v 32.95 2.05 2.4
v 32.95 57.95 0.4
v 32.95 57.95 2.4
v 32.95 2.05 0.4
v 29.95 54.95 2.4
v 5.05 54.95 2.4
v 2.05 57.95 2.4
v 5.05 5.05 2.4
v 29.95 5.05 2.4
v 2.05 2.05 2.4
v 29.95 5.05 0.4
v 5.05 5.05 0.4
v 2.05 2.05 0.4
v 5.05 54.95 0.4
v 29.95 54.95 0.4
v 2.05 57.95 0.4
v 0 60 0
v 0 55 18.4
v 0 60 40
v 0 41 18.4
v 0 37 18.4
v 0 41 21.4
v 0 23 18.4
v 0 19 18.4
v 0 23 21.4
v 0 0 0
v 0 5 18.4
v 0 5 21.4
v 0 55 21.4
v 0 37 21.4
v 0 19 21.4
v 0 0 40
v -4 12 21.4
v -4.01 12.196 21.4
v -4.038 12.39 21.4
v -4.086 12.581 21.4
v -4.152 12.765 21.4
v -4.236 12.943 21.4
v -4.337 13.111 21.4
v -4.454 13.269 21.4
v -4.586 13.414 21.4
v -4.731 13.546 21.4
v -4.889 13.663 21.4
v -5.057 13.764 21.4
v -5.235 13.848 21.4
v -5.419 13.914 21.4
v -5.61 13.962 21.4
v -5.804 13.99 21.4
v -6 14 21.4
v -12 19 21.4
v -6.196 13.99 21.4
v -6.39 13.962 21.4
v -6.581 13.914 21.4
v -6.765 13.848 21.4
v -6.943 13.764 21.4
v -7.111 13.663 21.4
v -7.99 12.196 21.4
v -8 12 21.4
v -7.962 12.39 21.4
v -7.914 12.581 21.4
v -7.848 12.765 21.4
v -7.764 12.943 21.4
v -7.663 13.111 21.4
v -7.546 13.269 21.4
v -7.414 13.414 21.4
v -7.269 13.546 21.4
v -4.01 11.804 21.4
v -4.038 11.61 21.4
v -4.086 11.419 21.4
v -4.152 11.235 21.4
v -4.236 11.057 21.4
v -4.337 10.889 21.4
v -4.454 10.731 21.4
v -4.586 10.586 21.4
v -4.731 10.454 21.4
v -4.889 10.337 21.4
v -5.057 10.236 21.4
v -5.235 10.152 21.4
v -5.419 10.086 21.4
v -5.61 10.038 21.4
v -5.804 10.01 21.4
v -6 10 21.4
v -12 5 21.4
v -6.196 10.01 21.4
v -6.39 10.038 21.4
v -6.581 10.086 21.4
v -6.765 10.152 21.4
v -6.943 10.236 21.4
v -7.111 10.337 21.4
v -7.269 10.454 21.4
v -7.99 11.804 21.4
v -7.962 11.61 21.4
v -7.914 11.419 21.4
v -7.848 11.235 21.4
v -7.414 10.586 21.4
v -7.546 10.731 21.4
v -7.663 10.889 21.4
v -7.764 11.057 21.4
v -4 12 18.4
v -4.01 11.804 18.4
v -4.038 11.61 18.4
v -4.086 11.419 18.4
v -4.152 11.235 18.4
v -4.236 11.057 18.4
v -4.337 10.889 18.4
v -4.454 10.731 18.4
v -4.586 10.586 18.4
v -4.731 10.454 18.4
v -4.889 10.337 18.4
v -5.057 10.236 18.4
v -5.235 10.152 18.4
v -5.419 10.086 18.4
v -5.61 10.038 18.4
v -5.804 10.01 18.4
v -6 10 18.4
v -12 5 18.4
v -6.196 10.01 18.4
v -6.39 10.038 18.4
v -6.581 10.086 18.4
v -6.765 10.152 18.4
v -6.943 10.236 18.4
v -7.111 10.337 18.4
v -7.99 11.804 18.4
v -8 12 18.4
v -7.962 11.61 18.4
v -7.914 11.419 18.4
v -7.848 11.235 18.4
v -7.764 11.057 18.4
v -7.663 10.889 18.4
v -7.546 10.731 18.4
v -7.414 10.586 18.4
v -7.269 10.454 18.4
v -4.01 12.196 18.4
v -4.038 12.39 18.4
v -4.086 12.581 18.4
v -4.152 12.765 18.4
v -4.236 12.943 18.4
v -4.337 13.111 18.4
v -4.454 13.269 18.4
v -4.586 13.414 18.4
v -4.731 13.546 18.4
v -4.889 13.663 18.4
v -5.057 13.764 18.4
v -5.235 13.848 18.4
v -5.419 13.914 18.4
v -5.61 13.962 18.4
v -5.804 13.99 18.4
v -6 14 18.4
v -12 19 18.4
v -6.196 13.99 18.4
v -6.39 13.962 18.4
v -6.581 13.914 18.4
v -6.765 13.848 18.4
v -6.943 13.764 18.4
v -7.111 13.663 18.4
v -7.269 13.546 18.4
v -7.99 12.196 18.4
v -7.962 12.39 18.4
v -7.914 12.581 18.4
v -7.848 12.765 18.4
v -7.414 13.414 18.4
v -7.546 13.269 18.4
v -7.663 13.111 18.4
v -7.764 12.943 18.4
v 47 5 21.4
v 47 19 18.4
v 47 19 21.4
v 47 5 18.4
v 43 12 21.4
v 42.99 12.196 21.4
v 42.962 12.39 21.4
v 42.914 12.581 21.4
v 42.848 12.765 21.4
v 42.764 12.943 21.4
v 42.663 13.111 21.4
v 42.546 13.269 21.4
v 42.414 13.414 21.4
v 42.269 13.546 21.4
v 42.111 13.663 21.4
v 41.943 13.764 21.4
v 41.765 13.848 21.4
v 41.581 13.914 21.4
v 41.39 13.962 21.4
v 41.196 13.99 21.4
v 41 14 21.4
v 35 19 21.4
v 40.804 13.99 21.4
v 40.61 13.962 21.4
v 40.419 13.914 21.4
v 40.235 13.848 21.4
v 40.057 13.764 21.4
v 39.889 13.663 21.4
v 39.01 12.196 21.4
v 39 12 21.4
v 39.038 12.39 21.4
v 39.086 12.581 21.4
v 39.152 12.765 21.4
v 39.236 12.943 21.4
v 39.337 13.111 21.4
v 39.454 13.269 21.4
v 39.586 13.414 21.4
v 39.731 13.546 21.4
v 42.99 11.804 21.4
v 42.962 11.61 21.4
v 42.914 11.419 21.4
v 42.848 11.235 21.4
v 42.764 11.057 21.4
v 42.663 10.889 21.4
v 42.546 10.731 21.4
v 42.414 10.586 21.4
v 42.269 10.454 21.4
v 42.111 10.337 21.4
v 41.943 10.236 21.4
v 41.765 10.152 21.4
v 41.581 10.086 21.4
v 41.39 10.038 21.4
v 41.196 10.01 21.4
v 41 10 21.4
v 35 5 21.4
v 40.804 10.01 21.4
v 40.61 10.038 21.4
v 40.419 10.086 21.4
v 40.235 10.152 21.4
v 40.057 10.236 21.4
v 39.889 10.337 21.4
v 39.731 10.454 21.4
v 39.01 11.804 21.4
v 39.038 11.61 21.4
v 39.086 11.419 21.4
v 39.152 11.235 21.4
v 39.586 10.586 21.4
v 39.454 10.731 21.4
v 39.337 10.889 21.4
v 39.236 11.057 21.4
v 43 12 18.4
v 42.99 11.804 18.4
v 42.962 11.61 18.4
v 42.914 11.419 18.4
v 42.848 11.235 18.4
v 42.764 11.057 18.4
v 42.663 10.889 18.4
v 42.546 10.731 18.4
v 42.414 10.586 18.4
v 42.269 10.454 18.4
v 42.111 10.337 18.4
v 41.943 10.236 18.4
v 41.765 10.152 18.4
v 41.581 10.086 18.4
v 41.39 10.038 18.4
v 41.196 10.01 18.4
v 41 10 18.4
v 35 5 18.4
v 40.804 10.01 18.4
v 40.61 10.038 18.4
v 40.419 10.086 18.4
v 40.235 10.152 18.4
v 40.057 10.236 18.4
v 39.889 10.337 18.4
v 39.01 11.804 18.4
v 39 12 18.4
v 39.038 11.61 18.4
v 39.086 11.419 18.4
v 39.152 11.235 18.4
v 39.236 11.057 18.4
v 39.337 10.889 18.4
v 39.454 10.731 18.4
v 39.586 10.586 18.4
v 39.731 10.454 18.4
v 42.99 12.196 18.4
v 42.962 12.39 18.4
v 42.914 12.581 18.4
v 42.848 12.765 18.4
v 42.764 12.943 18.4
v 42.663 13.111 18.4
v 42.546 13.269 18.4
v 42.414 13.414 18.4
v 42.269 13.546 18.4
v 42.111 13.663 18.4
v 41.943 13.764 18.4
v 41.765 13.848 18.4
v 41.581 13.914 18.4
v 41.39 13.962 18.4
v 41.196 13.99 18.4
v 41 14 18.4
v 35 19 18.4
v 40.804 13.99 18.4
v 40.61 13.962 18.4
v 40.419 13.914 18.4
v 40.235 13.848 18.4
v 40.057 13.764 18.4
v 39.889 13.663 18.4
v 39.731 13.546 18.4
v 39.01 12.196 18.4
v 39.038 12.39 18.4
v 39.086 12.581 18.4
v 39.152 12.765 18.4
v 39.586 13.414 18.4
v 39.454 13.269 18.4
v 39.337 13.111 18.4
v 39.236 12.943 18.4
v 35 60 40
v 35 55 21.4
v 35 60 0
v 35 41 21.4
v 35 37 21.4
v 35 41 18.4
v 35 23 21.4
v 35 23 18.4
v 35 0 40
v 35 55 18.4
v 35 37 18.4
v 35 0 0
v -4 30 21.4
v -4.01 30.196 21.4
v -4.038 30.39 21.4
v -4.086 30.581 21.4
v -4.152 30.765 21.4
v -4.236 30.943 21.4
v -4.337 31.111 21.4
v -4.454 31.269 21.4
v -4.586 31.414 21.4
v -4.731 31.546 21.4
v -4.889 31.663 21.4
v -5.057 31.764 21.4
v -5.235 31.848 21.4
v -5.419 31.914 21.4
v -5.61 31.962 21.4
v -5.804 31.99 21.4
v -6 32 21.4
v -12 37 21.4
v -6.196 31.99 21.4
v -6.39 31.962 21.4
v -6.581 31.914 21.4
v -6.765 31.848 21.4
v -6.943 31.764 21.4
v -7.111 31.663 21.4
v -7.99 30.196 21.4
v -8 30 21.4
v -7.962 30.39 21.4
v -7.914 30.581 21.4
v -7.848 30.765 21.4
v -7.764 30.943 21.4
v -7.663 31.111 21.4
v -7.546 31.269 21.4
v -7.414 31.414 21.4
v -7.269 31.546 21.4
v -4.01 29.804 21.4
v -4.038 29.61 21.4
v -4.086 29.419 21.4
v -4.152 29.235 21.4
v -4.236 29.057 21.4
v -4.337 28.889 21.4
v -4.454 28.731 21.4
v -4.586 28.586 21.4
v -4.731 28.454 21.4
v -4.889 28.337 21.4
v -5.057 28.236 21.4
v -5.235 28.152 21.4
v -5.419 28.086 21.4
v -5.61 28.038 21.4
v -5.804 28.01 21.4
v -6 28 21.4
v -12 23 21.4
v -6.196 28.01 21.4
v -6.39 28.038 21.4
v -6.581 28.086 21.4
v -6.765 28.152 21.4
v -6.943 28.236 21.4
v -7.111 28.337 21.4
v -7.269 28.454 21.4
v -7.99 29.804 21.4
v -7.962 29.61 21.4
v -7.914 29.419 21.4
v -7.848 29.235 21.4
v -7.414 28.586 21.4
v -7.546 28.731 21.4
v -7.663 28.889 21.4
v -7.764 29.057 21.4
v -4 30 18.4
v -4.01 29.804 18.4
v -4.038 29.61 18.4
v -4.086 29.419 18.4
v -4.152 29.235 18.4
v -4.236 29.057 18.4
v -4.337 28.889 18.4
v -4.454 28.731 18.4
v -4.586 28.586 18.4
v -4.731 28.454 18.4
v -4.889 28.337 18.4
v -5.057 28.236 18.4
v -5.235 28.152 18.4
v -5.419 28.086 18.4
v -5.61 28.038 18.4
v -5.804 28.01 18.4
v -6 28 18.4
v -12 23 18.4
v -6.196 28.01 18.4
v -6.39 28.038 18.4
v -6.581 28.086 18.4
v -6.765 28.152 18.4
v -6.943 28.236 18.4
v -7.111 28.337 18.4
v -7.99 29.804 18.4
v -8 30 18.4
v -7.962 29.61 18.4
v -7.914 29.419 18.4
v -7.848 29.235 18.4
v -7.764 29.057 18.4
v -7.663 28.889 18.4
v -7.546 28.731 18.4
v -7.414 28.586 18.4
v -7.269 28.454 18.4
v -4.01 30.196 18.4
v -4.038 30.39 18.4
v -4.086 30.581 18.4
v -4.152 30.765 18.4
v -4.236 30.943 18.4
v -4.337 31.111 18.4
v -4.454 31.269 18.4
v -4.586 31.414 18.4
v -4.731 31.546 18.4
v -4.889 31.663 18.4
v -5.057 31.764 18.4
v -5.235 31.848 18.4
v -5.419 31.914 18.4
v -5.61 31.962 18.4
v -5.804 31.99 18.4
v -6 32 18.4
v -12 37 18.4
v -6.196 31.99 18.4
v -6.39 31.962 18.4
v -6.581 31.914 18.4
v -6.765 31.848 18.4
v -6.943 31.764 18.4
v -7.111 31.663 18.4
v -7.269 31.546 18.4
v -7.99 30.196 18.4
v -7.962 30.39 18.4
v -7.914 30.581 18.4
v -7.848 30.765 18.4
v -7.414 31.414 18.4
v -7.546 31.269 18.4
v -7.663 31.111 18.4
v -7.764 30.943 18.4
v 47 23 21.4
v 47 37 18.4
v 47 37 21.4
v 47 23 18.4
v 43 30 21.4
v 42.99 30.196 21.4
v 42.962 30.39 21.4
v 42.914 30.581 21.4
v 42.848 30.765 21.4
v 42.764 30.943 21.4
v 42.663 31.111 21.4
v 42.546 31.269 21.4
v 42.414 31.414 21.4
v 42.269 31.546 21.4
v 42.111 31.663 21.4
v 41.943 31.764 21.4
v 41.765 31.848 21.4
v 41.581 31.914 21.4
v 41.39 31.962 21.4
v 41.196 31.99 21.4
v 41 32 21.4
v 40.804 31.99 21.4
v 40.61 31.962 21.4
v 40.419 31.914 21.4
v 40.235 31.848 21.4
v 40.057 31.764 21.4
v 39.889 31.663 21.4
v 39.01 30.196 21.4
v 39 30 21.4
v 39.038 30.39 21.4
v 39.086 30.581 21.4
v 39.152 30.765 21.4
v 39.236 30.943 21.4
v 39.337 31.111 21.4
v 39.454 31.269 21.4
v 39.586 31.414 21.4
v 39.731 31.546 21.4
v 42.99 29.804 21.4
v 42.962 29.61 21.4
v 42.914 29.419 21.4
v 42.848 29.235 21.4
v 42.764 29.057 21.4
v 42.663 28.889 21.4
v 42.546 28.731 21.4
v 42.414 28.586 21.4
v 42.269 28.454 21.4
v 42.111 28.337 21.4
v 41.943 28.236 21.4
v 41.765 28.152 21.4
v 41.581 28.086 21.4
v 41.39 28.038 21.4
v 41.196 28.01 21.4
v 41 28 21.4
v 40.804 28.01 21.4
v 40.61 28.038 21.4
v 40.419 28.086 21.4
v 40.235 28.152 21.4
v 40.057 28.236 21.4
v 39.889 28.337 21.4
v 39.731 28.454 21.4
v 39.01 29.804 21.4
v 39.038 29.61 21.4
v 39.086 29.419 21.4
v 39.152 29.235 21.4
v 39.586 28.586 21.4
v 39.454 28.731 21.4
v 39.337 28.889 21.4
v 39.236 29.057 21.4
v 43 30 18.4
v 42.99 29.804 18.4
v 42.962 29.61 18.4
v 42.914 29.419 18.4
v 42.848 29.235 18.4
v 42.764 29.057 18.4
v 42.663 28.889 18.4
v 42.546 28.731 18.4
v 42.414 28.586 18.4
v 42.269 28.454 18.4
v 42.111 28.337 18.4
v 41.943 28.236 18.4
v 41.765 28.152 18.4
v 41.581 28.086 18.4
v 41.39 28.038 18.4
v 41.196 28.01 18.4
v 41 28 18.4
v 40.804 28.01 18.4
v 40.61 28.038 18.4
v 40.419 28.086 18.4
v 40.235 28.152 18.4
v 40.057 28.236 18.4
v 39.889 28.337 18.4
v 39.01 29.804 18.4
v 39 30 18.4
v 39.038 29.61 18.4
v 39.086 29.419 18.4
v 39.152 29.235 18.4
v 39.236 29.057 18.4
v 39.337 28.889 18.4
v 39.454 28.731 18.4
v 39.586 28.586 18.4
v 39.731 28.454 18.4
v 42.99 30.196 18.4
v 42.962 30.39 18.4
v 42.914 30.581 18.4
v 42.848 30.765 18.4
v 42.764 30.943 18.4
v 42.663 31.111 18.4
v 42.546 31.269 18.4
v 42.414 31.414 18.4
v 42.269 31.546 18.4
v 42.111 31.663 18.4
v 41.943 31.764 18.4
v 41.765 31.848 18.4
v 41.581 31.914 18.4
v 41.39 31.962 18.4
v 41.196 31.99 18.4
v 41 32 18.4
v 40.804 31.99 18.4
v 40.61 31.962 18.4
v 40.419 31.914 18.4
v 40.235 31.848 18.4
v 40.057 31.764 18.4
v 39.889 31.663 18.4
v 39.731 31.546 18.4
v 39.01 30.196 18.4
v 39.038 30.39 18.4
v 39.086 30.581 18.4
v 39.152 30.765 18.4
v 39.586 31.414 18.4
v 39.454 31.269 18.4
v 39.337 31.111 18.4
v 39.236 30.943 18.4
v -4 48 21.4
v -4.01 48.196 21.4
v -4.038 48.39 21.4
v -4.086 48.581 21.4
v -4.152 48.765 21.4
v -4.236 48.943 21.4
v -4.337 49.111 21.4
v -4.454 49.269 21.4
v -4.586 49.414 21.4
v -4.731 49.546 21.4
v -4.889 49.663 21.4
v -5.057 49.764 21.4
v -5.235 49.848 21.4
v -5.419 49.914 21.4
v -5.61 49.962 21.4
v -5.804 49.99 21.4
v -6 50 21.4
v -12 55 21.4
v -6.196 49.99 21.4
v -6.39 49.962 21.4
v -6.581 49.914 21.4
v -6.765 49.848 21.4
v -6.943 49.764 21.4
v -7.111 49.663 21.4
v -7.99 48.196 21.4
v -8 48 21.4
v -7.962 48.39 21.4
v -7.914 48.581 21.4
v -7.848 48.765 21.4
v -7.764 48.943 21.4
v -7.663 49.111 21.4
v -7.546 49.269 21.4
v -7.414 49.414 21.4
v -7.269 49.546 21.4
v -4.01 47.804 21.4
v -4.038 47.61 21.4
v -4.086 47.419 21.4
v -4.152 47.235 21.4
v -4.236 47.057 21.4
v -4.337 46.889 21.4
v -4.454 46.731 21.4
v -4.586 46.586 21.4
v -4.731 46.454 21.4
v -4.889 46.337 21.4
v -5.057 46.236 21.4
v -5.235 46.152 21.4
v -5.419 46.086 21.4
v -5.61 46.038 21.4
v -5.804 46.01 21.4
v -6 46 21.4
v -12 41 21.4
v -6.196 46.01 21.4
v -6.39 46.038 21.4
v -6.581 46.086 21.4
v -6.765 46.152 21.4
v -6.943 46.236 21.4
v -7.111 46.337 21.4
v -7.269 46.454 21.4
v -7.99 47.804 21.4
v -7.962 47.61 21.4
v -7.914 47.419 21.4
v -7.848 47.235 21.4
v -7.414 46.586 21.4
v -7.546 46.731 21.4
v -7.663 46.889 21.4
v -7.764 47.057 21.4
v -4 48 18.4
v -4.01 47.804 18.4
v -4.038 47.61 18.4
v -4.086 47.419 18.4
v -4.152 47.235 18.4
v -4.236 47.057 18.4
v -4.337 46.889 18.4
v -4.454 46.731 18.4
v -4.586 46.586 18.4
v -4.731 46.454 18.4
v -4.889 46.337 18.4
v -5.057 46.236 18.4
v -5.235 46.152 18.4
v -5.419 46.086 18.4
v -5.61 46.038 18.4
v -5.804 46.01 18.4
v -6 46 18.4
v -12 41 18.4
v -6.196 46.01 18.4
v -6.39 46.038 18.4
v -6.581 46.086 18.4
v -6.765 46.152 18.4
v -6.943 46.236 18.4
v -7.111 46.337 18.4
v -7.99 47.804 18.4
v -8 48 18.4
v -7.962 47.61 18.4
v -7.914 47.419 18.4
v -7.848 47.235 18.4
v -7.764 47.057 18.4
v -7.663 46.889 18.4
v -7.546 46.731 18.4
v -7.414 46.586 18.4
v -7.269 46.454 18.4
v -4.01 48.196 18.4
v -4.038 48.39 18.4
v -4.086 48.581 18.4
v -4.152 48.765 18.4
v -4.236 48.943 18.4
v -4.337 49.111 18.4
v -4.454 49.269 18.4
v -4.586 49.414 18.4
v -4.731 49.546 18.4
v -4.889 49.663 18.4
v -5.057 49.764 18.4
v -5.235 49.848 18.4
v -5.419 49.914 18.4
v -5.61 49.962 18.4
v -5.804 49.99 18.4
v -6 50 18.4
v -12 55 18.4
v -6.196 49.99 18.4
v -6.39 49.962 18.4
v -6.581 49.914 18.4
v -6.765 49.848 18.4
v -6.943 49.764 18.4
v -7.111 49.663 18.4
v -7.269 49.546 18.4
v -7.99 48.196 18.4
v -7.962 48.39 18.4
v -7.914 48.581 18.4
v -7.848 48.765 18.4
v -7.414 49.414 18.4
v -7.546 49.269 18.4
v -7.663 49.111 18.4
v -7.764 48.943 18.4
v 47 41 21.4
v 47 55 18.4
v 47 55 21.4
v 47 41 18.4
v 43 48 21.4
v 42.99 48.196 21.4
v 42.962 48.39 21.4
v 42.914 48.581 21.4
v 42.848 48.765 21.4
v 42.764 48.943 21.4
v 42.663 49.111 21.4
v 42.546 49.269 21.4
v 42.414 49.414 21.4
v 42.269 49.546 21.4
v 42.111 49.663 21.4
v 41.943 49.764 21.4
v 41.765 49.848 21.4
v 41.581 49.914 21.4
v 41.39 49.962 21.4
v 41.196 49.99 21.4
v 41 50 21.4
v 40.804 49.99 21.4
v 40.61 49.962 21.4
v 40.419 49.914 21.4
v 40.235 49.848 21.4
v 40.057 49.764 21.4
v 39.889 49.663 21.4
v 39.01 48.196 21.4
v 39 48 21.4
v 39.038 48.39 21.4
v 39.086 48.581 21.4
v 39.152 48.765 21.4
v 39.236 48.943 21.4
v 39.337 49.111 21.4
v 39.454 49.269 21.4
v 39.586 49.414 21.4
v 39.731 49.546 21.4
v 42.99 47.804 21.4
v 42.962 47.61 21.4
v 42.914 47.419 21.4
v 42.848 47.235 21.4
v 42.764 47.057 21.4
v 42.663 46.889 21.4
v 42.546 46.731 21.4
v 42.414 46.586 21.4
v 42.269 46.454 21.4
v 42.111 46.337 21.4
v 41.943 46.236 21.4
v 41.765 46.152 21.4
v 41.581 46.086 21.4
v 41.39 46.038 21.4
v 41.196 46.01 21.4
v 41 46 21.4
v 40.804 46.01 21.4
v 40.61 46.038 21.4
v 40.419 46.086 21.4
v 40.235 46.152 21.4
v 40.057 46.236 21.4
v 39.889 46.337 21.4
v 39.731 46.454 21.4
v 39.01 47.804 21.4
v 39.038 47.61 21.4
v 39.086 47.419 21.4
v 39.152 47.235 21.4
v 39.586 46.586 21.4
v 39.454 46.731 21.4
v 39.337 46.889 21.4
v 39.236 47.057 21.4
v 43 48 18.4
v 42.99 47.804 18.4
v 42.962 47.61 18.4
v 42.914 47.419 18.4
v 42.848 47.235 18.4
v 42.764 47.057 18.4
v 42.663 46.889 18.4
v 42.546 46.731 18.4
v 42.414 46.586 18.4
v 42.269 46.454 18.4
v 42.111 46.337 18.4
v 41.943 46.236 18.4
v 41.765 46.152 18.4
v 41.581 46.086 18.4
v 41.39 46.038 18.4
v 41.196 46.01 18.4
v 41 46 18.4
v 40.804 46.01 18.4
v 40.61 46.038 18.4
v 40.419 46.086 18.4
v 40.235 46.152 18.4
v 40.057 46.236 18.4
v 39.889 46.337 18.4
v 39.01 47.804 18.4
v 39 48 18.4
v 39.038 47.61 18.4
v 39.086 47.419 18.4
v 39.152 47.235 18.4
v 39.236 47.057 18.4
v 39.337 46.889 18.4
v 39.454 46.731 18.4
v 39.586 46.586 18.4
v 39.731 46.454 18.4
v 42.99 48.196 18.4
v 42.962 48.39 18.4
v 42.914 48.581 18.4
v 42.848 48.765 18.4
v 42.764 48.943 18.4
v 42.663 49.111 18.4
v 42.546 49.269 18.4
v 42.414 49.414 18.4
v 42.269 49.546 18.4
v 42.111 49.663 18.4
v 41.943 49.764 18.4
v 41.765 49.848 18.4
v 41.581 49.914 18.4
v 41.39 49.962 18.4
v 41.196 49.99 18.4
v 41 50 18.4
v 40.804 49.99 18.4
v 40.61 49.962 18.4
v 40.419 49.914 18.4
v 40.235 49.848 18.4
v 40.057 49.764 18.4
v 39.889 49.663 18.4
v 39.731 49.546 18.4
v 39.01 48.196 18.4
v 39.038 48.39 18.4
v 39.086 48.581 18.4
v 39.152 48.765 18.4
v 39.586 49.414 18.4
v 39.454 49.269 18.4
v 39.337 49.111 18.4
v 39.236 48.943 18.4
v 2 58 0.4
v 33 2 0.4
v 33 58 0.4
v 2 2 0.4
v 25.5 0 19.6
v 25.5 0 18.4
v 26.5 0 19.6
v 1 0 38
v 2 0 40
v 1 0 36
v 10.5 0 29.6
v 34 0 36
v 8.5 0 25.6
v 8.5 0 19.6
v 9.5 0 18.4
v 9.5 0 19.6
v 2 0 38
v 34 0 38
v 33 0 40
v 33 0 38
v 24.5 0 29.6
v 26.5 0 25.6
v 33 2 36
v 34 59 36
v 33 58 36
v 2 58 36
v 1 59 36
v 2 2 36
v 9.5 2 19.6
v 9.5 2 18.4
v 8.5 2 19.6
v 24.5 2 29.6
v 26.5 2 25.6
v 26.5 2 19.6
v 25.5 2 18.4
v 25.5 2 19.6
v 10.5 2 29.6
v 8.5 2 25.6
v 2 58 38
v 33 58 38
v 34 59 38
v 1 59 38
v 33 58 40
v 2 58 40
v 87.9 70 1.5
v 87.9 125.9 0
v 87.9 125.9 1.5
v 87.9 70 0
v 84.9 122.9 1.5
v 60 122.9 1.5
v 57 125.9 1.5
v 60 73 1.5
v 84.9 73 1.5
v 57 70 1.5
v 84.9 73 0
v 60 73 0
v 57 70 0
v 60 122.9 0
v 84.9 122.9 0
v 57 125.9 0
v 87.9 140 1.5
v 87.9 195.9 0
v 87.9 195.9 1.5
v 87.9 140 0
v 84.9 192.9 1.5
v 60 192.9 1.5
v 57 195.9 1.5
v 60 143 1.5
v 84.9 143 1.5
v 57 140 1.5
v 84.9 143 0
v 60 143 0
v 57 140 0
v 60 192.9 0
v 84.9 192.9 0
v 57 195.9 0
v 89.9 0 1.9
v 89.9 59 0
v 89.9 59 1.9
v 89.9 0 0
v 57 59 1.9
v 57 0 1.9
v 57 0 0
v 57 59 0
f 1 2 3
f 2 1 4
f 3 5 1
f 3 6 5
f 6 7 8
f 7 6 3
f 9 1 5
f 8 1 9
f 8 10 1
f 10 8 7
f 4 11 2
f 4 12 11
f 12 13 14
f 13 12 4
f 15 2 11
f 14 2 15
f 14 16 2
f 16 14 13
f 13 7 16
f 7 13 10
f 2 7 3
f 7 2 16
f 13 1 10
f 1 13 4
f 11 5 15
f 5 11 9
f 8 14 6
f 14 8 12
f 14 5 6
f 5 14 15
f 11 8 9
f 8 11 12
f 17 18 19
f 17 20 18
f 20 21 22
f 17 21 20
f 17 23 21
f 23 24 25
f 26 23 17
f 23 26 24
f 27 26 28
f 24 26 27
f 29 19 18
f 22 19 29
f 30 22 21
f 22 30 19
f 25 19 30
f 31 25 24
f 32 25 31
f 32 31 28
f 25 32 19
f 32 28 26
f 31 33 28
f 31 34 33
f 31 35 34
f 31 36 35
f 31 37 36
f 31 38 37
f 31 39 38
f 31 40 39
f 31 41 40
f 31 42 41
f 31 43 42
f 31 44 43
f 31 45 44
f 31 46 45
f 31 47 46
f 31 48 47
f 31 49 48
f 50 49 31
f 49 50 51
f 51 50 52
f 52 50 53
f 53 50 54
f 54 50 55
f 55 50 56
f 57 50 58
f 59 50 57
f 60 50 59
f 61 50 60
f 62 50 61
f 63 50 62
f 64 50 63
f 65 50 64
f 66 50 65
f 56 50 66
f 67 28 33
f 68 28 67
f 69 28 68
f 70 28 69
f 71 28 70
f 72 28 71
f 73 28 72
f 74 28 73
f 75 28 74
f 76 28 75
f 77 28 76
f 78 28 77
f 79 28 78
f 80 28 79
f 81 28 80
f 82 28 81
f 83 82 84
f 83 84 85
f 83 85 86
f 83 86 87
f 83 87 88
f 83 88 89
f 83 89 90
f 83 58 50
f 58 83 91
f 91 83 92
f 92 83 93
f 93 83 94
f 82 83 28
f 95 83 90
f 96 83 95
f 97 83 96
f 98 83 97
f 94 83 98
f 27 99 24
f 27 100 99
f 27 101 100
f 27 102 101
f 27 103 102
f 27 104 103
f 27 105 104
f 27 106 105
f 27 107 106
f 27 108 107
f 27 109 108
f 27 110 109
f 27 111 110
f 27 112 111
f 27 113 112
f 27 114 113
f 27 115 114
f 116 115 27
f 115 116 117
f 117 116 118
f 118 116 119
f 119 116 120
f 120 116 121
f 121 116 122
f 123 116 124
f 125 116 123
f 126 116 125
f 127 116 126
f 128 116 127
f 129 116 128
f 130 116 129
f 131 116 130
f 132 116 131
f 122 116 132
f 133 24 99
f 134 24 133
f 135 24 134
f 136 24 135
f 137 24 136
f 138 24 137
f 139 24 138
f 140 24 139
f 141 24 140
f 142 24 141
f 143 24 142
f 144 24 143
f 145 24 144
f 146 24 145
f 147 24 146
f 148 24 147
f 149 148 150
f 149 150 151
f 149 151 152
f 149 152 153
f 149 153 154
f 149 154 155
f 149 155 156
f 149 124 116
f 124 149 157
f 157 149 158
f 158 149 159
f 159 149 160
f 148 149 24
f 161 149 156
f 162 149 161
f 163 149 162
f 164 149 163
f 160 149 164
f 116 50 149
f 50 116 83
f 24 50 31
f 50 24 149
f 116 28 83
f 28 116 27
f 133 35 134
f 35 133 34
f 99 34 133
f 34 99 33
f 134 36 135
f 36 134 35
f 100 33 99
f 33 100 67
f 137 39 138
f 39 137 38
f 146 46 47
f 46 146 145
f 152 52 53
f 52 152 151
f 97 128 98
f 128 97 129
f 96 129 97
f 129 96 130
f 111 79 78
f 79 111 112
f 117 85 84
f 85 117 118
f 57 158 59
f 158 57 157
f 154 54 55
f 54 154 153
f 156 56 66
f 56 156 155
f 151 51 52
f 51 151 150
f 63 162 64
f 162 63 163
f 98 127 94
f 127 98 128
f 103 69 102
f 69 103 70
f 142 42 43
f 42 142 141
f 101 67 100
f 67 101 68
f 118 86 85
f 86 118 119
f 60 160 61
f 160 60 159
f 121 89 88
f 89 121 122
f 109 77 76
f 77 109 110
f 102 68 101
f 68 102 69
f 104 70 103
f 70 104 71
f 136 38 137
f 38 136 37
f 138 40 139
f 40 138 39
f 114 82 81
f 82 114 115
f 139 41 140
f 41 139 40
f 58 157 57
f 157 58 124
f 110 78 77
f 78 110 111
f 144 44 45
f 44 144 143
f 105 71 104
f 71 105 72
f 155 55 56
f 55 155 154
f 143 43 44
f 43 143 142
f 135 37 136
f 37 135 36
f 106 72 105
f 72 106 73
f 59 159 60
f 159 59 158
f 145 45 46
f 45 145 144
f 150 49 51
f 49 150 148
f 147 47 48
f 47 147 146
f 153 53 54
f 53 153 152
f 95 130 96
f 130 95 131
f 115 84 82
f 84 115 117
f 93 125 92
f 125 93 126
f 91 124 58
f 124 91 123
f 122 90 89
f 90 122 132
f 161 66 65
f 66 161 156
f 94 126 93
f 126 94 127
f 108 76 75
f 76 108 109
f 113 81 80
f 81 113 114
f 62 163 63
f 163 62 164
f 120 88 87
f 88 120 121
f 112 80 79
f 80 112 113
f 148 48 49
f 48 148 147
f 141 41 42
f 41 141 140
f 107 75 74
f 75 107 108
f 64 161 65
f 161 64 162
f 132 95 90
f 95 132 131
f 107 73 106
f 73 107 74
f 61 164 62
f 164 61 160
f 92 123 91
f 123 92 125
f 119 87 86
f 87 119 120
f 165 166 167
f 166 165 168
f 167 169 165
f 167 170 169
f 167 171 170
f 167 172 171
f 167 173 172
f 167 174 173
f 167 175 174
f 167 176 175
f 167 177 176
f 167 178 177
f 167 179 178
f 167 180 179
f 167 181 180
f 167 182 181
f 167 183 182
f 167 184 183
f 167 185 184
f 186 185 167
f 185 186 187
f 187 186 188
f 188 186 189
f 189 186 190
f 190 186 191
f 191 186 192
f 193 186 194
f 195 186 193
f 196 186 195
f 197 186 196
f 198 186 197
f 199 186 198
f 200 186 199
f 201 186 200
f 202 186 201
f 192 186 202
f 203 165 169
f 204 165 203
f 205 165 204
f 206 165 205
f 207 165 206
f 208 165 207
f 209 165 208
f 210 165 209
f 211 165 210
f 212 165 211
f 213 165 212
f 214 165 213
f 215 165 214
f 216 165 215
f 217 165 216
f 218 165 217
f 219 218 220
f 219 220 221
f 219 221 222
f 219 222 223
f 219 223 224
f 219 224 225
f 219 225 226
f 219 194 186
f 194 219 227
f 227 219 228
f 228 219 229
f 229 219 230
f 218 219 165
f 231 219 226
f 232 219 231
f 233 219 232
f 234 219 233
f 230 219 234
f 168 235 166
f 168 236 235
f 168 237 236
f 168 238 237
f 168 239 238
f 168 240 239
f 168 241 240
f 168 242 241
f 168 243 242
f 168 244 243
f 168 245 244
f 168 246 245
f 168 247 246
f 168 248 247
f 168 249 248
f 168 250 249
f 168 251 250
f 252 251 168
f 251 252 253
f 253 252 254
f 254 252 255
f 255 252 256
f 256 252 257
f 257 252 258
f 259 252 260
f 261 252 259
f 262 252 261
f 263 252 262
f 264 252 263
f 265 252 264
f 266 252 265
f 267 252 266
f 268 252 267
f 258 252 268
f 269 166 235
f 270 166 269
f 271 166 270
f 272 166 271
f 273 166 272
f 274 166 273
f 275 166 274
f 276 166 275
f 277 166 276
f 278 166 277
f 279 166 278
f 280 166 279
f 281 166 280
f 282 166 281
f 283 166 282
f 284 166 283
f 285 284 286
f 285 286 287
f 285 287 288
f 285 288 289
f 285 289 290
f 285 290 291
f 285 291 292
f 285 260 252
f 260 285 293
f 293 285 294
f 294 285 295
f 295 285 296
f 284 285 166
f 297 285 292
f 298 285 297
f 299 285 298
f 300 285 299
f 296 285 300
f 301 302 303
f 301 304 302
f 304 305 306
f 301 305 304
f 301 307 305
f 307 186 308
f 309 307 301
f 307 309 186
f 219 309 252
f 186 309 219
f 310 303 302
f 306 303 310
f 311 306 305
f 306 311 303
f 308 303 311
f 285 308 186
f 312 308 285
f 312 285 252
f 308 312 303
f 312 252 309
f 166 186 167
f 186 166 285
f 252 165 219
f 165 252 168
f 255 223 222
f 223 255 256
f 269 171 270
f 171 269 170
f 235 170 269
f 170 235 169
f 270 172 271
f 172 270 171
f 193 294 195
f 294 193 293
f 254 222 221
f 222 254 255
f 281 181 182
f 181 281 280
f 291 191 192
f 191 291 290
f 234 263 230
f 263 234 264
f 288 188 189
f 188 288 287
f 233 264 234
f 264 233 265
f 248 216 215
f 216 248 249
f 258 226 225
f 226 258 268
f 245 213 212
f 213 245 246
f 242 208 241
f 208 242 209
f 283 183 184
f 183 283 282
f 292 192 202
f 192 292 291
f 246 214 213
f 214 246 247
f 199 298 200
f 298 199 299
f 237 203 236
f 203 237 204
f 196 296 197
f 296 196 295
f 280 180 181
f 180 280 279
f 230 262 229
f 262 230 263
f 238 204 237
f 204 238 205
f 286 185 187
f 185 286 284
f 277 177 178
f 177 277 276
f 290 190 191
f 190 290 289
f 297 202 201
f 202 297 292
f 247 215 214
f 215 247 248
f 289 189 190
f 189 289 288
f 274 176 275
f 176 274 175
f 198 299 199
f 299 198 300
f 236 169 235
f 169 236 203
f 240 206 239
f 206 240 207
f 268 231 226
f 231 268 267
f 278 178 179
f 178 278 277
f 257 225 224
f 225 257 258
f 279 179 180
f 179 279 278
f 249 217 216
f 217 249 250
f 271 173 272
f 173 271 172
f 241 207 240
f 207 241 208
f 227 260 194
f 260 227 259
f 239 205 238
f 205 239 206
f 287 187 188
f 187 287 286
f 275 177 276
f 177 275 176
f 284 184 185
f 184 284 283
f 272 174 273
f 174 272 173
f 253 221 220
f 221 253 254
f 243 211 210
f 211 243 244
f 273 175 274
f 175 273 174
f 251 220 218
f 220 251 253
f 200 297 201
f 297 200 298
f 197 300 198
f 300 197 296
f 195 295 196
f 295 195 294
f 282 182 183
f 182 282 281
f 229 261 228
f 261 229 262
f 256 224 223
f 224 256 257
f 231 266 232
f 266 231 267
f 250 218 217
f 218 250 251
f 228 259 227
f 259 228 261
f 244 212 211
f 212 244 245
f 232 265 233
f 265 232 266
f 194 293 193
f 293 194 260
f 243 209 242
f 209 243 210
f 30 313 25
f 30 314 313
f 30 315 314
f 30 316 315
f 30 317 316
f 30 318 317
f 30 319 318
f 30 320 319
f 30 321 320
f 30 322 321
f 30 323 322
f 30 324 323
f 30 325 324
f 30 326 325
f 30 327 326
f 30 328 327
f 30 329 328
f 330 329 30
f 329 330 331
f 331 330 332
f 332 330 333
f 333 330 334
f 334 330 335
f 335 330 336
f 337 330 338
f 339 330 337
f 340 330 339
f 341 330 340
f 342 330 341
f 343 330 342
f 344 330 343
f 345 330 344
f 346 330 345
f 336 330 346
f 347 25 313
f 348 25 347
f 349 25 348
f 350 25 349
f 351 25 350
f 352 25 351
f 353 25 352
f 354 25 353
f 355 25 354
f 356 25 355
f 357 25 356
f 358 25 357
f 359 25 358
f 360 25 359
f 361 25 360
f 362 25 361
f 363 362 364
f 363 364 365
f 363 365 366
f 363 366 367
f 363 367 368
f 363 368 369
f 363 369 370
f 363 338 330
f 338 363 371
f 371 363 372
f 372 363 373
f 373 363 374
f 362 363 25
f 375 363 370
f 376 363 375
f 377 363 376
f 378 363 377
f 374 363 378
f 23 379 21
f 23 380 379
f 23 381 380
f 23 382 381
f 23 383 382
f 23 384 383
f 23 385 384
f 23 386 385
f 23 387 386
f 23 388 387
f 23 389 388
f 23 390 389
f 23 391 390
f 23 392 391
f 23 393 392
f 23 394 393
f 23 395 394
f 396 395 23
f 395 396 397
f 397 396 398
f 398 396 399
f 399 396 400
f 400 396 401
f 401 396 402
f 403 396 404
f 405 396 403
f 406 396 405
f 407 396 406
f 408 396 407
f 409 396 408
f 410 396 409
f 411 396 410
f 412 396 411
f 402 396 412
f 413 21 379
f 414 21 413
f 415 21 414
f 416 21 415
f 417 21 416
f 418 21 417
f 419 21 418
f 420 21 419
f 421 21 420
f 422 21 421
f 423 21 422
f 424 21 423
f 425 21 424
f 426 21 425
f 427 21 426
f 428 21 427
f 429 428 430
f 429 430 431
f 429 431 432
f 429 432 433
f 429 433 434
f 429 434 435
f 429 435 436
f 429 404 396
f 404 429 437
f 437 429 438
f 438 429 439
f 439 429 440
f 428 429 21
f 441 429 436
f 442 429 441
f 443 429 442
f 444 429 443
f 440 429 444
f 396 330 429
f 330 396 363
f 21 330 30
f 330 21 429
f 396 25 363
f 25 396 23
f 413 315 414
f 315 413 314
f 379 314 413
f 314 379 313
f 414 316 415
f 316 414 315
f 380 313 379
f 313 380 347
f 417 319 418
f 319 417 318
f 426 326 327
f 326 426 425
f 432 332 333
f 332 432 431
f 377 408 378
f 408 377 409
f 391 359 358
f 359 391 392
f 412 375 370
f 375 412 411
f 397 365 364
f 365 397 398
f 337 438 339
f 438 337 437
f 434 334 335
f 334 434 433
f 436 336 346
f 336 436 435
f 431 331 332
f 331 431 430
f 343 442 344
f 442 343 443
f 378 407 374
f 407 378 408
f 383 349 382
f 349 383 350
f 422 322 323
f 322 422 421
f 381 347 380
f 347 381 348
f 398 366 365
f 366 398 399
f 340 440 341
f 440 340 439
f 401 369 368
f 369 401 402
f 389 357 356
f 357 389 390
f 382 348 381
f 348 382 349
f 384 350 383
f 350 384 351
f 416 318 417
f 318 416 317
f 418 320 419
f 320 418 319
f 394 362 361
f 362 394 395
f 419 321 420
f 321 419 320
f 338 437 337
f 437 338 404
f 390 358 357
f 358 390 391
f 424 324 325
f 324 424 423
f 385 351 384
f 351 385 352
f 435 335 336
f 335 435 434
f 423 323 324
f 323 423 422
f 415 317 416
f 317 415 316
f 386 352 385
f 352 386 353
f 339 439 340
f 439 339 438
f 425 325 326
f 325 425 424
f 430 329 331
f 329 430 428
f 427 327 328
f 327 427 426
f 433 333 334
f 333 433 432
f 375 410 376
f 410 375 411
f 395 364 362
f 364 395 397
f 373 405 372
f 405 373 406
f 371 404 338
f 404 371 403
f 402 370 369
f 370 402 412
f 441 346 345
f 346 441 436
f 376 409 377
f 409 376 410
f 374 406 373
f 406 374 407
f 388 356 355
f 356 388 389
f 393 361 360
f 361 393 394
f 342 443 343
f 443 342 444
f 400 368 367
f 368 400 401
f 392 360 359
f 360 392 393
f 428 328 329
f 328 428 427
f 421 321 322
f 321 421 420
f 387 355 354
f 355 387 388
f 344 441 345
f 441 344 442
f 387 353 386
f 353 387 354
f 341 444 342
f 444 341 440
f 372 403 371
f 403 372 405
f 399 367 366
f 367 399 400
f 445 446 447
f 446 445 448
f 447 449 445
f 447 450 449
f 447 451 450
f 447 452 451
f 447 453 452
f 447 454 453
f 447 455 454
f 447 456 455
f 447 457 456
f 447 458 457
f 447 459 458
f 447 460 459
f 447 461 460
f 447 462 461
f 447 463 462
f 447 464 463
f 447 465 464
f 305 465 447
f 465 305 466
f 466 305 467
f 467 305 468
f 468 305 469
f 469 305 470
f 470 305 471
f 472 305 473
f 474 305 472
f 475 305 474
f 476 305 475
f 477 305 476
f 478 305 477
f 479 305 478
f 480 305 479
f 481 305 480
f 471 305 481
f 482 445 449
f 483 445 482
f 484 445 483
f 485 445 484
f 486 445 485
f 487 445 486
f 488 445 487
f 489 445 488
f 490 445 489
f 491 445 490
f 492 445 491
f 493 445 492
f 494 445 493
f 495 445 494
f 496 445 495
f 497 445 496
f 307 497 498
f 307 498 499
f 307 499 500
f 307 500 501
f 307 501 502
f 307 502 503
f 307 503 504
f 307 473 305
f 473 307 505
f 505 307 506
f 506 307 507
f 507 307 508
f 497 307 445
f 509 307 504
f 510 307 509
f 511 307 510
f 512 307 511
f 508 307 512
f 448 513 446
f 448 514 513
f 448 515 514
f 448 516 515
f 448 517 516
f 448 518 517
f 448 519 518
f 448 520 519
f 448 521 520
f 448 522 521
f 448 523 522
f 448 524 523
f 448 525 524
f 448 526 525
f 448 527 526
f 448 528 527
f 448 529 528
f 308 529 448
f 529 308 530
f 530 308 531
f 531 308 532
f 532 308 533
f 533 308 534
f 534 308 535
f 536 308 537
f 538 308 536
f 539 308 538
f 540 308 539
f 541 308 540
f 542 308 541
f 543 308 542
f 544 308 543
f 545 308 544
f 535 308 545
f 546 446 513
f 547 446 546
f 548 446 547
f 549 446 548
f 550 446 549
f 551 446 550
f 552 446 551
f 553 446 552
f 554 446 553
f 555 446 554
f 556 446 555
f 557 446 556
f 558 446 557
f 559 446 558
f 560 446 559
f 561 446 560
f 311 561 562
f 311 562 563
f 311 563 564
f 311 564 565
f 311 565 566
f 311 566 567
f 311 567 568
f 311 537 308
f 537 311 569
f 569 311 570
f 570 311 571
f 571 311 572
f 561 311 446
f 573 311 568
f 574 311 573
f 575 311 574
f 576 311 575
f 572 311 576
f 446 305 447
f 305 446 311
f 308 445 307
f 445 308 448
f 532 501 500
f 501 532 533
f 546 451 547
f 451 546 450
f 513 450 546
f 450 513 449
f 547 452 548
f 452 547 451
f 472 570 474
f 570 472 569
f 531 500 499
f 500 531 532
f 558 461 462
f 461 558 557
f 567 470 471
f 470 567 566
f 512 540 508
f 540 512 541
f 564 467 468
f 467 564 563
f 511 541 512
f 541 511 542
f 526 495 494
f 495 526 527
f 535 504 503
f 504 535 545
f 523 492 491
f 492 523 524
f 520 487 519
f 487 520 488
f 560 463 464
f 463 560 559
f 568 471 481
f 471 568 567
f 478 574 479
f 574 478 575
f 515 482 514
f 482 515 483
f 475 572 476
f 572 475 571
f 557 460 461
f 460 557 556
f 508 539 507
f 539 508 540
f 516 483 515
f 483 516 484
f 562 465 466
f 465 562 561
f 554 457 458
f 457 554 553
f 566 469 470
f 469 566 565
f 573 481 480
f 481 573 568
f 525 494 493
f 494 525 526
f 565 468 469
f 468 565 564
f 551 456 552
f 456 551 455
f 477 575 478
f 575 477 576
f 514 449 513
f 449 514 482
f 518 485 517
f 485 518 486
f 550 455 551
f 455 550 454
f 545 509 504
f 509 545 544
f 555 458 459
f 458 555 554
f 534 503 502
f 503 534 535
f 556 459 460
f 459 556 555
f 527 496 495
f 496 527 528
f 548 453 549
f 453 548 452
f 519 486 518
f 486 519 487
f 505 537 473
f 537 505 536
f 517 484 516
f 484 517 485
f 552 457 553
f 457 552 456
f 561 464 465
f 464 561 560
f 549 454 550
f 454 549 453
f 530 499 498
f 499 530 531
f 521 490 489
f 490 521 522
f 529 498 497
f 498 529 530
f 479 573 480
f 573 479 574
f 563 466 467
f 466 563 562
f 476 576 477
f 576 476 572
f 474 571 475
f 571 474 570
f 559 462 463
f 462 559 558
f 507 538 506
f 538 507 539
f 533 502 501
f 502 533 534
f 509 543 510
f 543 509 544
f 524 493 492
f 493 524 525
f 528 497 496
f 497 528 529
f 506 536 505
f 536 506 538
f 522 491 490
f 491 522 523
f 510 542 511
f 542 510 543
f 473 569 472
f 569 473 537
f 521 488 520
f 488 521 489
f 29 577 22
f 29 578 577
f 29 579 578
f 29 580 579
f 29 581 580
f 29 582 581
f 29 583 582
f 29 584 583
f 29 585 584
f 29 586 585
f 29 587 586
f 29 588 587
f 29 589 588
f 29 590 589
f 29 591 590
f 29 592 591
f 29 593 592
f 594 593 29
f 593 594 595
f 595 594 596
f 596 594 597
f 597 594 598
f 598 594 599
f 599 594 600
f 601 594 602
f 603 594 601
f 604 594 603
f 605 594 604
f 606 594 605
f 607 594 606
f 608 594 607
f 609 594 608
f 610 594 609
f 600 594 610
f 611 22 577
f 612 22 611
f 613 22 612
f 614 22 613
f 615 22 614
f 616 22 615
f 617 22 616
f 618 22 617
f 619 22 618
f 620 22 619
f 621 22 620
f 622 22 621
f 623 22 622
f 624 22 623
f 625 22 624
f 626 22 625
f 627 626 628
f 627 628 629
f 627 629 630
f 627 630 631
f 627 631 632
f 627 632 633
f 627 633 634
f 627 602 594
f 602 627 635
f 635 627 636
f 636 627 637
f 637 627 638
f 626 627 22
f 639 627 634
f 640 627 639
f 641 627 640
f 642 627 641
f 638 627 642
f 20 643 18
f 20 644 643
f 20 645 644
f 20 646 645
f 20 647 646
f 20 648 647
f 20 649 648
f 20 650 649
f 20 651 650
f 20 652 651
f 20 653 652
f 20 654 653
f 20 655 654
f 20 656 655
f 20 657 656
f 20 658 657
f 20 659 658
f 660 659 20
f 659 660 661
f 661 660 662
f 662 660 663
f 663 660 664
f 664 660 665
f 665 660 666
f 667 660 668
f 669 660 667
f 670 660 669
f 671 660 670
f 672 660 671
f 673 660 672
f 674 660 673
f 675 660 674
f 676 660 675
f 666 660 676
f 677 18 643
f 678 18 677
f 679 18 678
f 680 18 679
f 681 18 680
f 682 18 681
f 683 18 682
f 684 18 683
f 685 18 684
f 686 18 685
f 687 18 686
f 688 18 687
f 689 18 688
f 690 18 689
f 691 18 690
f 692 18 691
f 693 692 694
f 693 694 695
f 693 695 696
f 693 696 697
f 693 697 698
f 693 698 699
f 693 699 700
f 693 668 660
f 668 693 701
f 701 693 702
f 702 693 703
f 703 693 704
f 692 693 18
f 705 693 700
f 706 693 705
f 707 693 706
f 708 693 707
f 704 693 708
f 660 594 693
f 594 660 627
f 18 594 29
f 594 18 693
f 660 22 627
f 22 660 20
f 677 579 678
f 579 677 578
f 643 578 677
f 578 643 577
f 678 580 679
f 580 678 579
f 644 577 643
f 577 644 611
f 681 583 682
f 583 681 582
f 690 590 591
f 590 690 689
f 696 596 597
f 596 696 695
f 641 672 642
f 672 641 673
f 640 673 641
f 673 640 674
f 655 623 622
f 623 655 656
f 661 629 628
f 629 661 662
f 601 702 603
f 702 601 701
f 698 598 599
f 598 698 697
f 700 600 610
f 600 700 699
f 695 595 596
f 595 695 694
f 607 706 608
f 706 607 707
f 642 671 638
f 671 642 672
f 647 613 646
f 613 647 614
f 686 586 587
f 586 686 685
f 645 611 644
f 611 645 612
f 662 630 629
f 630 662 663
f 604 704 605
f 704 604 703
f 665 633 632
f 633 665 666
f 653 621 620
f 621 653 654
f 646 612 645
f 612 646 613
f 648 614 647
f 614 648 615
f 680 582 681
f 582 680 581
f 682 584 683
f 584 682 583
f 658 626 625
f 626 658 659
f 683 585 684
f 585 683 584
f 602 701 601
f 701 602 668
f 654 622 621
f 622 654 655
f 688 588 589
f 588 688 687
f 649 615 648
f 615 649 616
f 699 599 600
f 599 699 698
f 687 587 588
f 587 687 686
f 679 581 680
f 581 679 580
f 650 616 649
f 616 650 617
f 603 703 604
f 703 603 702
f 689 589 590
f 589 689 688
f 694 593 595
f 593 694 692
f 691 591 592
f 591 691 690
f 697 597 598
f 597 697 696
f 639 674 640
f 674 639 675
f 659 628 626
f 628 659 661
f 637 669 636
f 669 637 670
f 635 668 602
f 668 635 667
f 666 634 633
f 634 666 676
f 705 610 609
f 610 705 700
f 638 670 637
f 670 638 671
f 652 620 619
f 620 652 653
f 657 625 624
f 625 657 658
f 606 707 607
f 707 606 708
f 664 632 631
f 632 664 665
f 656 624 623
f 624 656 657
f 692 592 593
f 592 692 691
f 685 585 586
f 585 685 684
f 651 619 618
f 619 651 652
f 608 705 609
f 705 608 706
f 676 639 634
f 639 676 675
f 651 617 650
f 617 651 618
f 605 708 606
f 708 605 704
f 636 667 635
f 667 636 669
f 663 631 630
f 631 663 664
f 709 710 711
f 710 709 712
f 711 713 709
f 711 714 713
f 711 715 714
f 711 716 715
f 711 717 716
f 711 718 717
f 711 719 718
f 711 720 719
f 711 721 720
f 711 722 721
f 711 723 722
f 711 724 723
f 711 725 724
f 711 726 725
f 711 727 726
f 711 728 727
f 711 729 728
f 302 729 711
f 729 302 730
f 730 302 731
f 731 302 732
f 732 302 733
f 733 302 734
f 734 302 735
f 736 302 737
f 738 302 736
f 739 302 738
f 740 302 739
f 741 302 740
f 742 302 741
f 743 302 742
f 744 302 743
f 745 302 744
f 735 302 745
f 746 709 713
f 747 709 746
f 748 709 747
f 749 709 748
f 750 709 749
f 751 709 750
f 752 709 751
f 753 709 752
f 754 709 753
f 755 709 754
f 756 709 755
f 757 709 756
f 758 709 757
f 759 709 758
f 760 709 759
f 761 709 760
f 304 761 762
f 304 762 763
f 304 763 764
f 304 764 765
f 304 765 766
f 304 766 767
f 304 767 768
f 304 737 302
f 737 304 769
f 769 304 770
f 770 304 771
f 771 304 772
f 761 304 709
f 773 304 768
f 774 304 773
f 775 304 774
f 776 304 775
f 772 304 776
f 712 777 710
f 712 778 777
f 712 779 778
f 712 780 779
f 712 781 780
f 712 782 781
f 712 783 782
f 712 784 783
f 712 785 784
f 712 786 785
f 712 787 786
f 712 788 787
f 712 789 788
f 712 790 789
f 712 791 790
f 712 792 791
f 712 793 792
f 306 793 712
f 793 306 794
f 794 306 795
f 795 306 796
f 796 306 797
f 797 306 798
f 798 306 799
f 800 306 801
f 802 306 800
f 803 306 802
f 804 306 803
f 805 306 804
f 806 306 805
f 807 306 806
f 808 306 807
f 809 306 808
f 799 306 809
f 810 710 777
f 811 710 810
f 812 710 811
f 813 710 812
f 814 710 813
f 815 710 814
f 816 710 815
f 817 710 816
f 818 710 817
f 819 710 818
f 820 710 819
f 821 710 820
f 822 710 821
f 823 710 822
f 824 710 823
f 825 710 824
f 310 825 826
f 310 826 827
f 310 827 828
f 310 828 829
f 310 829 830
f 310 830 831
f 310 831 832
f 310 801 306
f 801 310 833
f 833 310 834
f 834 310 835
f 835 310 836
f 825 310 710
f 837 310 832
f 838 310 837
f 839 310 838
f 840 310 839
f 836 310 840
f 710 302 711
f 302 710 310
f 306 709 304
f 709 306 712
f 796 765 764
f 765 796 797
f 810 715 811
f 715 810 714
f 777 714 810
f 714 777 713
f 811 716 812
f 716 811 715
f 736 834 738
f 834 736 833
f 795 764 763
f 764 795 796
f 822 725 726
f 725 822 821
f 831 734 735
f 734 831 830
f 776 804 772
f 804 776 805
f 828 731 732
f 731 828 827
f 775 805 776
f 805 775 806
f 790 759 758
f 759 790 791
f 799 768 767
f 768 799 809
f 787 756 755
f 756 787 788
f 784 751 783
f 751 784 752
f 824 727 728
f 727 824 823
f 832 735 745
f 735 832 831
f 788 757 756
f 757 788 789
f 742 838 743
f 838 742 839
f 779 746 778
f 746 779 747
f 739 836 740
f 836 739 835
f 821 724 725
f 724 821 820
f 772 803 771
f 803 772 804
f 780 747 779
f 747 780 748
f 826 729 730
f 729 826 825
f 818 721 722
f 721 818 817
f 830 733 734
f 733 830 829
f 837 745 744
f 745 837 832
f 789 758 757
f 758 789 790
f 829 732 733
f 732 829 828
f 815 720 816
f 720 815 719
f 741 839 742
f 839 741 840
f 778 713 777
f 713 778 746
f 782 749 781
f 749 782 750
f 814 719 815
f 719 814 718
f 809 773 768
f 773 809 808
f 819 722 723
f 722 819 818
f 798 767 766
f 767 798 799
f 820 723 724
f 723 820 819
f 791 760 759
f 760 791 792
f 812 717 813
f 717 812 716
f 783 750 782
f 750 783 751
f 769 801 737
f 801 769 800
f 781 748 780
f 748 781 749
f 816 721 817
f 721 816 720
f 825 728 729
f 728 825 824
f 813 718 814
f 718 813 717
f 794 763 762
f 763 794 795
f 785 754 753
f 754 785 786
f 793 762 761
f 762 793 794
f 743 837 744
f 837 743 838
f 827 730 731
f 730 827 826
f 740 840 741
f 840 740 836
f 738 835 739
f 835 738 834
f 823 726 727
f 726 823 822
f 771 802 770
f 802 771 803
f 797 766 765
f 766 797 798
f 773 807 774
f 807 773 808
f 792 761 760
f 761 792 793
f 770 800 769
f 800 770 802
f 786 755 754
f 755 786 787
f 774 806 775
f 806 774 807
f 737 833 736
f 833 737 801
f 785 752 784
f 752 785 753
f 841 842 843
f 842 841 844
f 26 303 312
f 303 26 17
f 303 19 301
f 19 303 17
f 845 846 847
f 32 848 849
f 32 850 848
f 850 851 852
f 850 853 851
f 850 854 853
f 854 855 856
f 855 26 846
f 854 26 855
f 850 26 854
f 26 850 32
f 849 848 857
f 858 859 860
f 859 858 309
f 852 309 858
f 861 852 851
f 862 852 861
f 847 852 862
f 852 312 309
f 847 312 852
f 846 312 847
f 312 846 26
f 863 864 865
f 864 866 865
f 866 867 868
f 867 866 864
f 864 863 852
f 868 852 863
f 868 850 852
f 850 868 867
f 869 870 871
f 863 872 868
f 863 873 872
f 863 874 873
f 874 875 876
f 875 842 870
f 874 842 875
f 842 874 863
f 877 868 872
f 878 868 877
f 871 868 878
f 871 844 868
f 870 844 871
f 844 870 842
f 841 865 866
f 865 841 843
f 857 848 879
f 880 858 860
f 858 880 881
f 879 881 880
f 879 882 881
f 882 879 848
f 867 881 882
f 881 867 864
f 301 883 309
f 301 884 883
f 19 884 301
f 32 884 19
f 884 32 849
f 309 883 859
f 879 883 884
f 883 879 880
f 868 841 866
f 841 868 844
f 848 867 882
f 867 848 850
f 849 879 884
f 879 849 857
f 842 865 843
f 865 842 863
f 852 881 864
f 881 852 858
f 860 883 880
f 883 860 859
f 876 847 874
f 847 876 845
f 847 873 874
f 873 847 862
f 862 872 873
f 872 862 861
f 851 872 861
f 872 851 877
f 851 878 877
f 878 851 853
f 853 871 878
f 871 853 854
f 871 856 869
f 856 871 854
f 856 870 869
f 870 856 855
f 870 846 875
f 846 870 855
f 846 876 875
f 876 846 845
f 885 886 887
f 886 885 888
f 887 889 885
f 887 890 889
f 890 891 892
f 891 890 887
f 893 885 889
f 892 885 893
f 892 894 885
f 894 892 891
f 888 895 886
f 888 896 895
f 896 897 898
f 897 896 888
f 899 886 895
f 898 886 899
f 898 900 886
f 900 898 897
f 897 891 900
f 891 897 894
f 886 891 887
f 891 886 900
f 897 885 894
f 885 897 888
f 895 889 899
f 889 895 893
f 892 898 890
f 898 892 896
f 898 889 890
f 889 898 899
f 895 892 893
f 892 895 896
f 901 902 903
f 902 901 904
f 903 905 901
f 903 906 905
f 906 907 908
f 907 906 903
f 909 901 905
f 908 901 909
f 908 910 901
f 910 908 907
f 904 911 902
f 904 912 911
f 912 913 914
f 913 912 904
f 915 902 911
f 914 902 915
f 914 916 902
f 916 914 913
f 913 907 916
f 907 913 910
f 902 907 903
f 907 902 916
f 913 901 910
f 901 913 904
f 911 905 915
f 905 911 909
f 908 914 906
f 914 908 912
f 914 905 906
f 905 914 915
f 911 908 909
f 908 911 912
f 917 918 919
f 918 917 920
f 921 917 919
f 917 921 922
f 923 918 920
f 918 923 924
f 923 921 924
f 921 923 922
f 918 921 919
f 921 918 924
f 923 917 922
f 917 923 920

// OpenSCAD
/*
CAIXA PARA COLMEIA COM TAMPA DESLIZANTE, MOLDURA FIXA E 2 MOLDURAS INTERNAS SEM FUROS
Medidas em milímetros.

Atualizações desta versão:
- Mantém a caixa e a tampa deslizante.
- As 2 molduras soltas ficam separadas para impressão.
- Molduras soltas SEM furos laterais, pois não serão parafusadas.
- Molduras soltas com 30,9 x 55,9 mm para encaixar dentro da caixa.
- Borda das duas molduras soltas e da moldura fixa alterada para 3 mm.
- Moldura fixa no fundo da caixa com borda de 3 mm.
- Centro do fundo/moldura deixado com 0,4 mm para destacar depois e abrir o vão da tela metálica.
*/

$fn = 64;
epsilon = 0.02;

// =========================
// MODO DE VISUALIZAÇÃO
// =========================
// "separada"  = caixa e tampa lado a lado, melhor para imprimir
// "encaixada" = tampa colocada dentro da canaleta, melhor para conferir o encaixe
modo_tampa = "separada";

// "separadas"     = molduras ao lado da caixa, melhor para imprimir
// "dentro_caixa"  = mostra as duas molduras soltas encaixadas dentro da caixa
modo_molduras = "separadas";

// Mostra uma telinha simbólica apenas para conferência visual.
mostrar_tela_visual = false;

// =========================
// MEDIDAS PRINCIPAIS
// =========================
largura_caixa      = 35;     // eixo X
comprimento_caixa  = 60;     // eixo Y
altura_caixa       = 40;     // eixo Z

espessura_parede   = 2;
espessura_fundo    = 0.4;    // camada fina destacável no centro

// =========================
// CANALETA DA TAMPA
// =========================
altura_canaleta    = 36;
canaleta_altura    = 2;
canaleta_profund   = 1;

// =========================
// TAMPA DESLIZANTE
// =========================
folga_lateral      = 0.10;
folga_altura       = 0.10;
folga_traseira     = 1.00;

largura_tampa      = largura_caixa - (2 * canaleta_profund) - folga_lateral; // 32,9 mm
comprimento_tampa  = comprimento_caixa - folga_traseira;                     // 59 mm
espessura_tampa    = canaleta_altura - folga_altura;                         // 1,9 mm

// =========================
// MOLDURAS / ESQUADROS INTERNOS PARA TELA METÁLICA
// =========================
// Medida interna real da caixa: 31 x 56 mm.
// Molduras soltas: 30,9 x 55,9 mm, com folga total de 0,1 mm.

moldura_folga_encaixe  = 0.10;

moldura_largura        = largura_caixa - (2 * espessura_parede) - moldura_folga_encaixe;     // 30,9 mm
moldura_comprimento    = comprimento_caixa - (2 * espessura_parede) - moldura_folga_encaixe; // 55,9 mm

moldura_pos_x          = espessura_parede + (moldura_folga_encaixe / 2);
moldura_pos_y          = espessura_parede + (moldura_folga_encaixe / 2);

// Molduras soltas
moldura_solta_espessura = 1.5;

// Borda da moldura fixa e das molduras soltas.
// Pedido: borda com 3 mm em todos os esquadros/molduras.
moldura_borda          = 3;

// Vão central onde ficará a tela metálica.
moldura_abertura_x     = moldura_largura - (2 * moldura_borda);       // 24,9 mm
moldura_abertura_y     = moldura_comprimento - (2 * moldura_borda);   // 49,9 mm

// Moldura fixa integrada ao fundo da caixa.
moldura_fixa_altura    = espessura_parede; // reforço de 2 mm de altura

// Espessura fina que fica fechando o centro para você destacar depois.
centro_destacavel_espessura = espessura_fundo; // 0,4 mm

// Tela visual, só referência.
tela_espessura_visual  = 0.25;

// =========================
// PRESILHAS
// =========================
entrada_colmeia    = 18.4;
presilha_extensao  = 12;
presilha_largura_y = 14;
presilha_espessura = 3;
furo_parafuso      = 4;
posicoes_presilhas_y = [5, 23, 41];

// =========================
// FURO POLIGONAL NA FRENTE
// =========================
furo_base_z = 18.4;
furo_centro_x = largura_caixa / 2;
furo_base_largura = 16;
furo_topo_largura = 14;
furo_vertical_baixo = 1.2;
furo_degrau_horizontal = 1;
furo_vertical_meio = 6;
furo_obliquo_altura = 4;
furo_obliquo_dx =
    (furo_base_largura + 2 * furo_degrau_horizontal - furo_topo_largura) / 2;

// =========================
// TAMPA
// =========================
module tampa_deslizante() {
    cube([
        largura_tampa,
        comprimento_tampa,
        espessura_tampa
    ], center = false);
}

// =========================
// MOLDURA SOLTA SEM FUROS
// =========================
module moldura_tela_metalica_solta() {
    difference() {
        cube([
            moldura_largura,
            moldura_comprimento,
            moldura_solta_espessura
        ], center = false);

        translate([
            moldura_borda,
            moldura_borda,
            -epsilon
        ])
            cube([
                moldura_abertura_x,
                moldura_abertura_y,
                moldura_solta_espessura + 2 * epsilon
            ], center = false);
    }
}

// =========================
// MOLDURA FIXA NO FUNDO DA CAIXA
// =========================
module moldura_fixa_fundo_caixa() {
    // Essa moldura fica grudada na caixa, por cima do fundo de 0,4 mm.
    // O centro NÃO é aberto completamente: fica só a camada fina de 0,4 mm
    // para destacar depois e colocar a tela metálica.
    translate([moldura_pos_x, moldura_pos_y, espessura_fundo])
        difference() {
            cube([
                moldura_largura,
                moldura_comprimento,
                moldura_fixa_altura
            ], center = false);

            translate([
                moldura_borda,
                moldura_borda,
                -epsilon
            ])
                cube([
                    moldura_abertura_x,
                    moldura_abertura_y,
                    moldura_fixa_altura + 2 * epsilon
                ], center = false);
        }
}

// =========================
// TELA VISUAL, APENAS PARA CONFERÊNCIA
// =========================
module tela_visual() {
    color([0.6, 0.6, 0.6, 0.45])
        translate([
            moldura_borda,
            moldura_borda,
            0
        ])
            cube([
                moldura_abertura_x,
                moldura_abertura_y,
                tela_espessura_visual
            ], center = false);
}

// =========================
// FURO POLIGONAL NA FRENTE
// =========================
module furo_poligonal_frente() {

    b = furo_base_largura / 2;

    z1 = furo_vertical_baixo;
    z2 = furo_vertical_baixo + furo_vertical_meio;
    z3 = furo_vertical_baixo + furo_vertical_meio + furo_obliquo_altura;

    x_base = b;
    x_externo = b + furo_degrau_horizontal;
    x_topo = x_externo - furo_obliquo_dx;

    pontos = [
        [-x_base,   0],
        [ x_base,   0],
        [ x_base,   z1],
        [ x_externo, z1],
        [ x_externo, z2],
        [ x_topo,   z3],

        [-x_topo,   z3],
        [-x_externo, z2],
        [-x_externo, z1],
        [-x_base,   z1]
    ];

    translate([
        furo_centro_x,
        espessura_parede + epsilon,
        furo_base_z
    ])
        rotate([90, 0, 0])
            linear_extrude(height = espessura_parede + 2 * epsilon)
                polygon(points = pontos);
}

// =========================
// CORPO DA CAIXA SEM FUROS
// =========================
module corpo_caixa_colmeia() {
    union() {

        // Fundo fino de 0,4 mm.
        // Ele fica fechado no centro da moldura para poder destacar depois.
        cube([largura_caixa, comprimento_caixa, espessura_fundo]);

        // Moldura fixa interna no fundo da caixa.
        moldura_fixa_fundo_caixa();

        // Parede da frente
        // Ela para antes da canaleta para deixar a entrada da tampa aberta.
        cube([largura_caixa, espessura_parede, altura_canaleta]);

        // Parede de trás — parte inferior
        translate([0, comprimento_caixa - espessura_parede, 0])
            cube([largura_caixa, espessura_parede, altura_canaleta]);

        // Parede de trás — parte da canaleta
        translate([0, comprimento_caixa - canaleta_profund, altura_canaleta])
            cube([largura_caixa, canaleta_profund, canaleta_altura]);

        // Parede de trás — parte superior
        translate([0, comprimento_caixa - espessura_parede, altura_canaleta + canaleta_altura])
            cube([
                largura_caixa,
                espessura_parede,
                altura_caixa - altura_canaleta - canaleta_altura
            ]);

        // Parede lateral esquerda — parte inferior
        cube([espessura_parede, comprimento_caixa, altura_canaleta]);

        // Parede lateral esquerda — parte da canaleta
        translate([0, 0, altura_canaleta])
            cube([canaleta_profund, comprimento_caixa, canaleta_altura]);

        // Parede lateral esquerda — parte superior
        translate([0, 0, altura_canaleta + canaleta_altura])
            cube([
                espessura_parede,
                comprimento_caixa,
                altura_caixa - altura_canaleta - canaleta_altura
            ]);

        // Parede lateral direita — parte inferior
        translate([largura_caixa - espessura_parede, 0, 0])
            cube([espessura_parede, comprimento_caixa, altura_canaleta]);

        // Parede lateral direita — parte da canaleta
        translate([largura_caixa - canaleta_profund, 0, altura_canaleta])
            cube([canaleta_profund, comprimento_caixa, canaleta_altura]);

        // Parede lateral direita — parte superior
        translate([largura_caixa - espessura_parede, 0, altura_canaleta + canaleta_altura])
            cube([
                espessura_parede,
                comprimento_caixa,
                altura_caixa - altura_canaleta - canaleta_altura
            ]);

        // Presilhas laterais da caixa
        for (ypos = posicoes_presilhas_y) {
            presilha_esquerda(ypos);
            presilha_direita(ypos);
        }
    }
}

// =========================
// CAIXA COM FUROS
// =========================
module caixa_colmeia() {
    difference() {
        corpo_caixa_colmeia();

        // Furo na parede da frente, na face y = 0
        furo_poligonal_frente();
    }
}

// =========================
// PRESILHA ESQUERDA
// =========================
module presilha_esquerda(ypos) {
    difference() {
        translate([-presilha_extensao, ypos, entrada_colmeia])
            cube([
                presilha_extensao,
                presilha_largura_y,
                presilha_espessura
            ]);

        translate([
            -presilha_extensao / 2,
            ypos + presilha_largura_y / 2,
            entrada_colmeia - 0.5
        ])
            cylinder(
                h = presilha_espessura + 1,
                d = furo_parafuso
            );
    }
}

// =========================
// PRESILHA DIREITA
// =========================
module presilha_direita(ypos) {
    difference() {
        translate([largura_caixa, ypos, entrada_colmeia])
            cube([
                presilha_extensao,
                presilha_largura_y,
                presilha_espessura
            ]);

        translate([
            largura_caixa + presilha_extensao / 2,
            ypos + presilha_largura_y / 2,
            entrada_colmeia - 0.5
        ])
            cylinder(
                h = presilha_espessura + 1,
                d = furo_parafuso
            );
    }
}

// =========================
// GERAR MODELO
// =========================
caixa_colmeia();

if (modo_tampa == "encaixada") {
    translate([
        (largura_caixa - largura_tampa) / 2,
        0,
        altura_canaleta + ((canaleta_altura - espessura_tampa) / 2)
    ])
        tampa_deslizante();
}
else {
    translate([
        largura_caixa + presilha_extensao + 10,
        0,
        0
    ])
        tampa_deslizante();
}

if (modo_molduras == "dentro_caixa") {
    // Mostra as duas molduras soltas encaixadas dentro da caixa.
    // A tela metálica ficaria entre a moldura fixa e uma moldura solta,
    // ou entre as duas molduras soltas, dependendo da montagem.

    translate([
        moldura_pos_x,
        moldura_pos_y,
        espessura_fundo + moldura_fixa_altura
    ])
        moldura_tela_metalica_solta();

    if (mostrar_tela_visual) {
        translate([
            moldura_pos_x,
            moldura_pos_y,
            espessura_fundo + moldura_fixa_altura + moldura_solta_espessura
        ])
            tela_visual();
    }

    translate([
        moldura_pos_x,
        moldura_pos_y,
        espessura_fundo + moldura_fixa_altura + moldura_solta_espessura + tela_espessura_visual
    ])
        moldura_tela_metalica_solta();
}
else {
    // Duas molduras idênticas, sem furos, separadas para impressão.

    translate([
        largura_caixa + presilha_extensao + 10,
        comprimento_caixa + 10,
        0
    ])
        moldura_tela_metalica_solta();

    translate([
        largura_caixa + presilha_extensao + 10,
        (2 * comprimento_caixa) + 20,
        0
    ])
        moldura_tela_metalica_solta();
}
